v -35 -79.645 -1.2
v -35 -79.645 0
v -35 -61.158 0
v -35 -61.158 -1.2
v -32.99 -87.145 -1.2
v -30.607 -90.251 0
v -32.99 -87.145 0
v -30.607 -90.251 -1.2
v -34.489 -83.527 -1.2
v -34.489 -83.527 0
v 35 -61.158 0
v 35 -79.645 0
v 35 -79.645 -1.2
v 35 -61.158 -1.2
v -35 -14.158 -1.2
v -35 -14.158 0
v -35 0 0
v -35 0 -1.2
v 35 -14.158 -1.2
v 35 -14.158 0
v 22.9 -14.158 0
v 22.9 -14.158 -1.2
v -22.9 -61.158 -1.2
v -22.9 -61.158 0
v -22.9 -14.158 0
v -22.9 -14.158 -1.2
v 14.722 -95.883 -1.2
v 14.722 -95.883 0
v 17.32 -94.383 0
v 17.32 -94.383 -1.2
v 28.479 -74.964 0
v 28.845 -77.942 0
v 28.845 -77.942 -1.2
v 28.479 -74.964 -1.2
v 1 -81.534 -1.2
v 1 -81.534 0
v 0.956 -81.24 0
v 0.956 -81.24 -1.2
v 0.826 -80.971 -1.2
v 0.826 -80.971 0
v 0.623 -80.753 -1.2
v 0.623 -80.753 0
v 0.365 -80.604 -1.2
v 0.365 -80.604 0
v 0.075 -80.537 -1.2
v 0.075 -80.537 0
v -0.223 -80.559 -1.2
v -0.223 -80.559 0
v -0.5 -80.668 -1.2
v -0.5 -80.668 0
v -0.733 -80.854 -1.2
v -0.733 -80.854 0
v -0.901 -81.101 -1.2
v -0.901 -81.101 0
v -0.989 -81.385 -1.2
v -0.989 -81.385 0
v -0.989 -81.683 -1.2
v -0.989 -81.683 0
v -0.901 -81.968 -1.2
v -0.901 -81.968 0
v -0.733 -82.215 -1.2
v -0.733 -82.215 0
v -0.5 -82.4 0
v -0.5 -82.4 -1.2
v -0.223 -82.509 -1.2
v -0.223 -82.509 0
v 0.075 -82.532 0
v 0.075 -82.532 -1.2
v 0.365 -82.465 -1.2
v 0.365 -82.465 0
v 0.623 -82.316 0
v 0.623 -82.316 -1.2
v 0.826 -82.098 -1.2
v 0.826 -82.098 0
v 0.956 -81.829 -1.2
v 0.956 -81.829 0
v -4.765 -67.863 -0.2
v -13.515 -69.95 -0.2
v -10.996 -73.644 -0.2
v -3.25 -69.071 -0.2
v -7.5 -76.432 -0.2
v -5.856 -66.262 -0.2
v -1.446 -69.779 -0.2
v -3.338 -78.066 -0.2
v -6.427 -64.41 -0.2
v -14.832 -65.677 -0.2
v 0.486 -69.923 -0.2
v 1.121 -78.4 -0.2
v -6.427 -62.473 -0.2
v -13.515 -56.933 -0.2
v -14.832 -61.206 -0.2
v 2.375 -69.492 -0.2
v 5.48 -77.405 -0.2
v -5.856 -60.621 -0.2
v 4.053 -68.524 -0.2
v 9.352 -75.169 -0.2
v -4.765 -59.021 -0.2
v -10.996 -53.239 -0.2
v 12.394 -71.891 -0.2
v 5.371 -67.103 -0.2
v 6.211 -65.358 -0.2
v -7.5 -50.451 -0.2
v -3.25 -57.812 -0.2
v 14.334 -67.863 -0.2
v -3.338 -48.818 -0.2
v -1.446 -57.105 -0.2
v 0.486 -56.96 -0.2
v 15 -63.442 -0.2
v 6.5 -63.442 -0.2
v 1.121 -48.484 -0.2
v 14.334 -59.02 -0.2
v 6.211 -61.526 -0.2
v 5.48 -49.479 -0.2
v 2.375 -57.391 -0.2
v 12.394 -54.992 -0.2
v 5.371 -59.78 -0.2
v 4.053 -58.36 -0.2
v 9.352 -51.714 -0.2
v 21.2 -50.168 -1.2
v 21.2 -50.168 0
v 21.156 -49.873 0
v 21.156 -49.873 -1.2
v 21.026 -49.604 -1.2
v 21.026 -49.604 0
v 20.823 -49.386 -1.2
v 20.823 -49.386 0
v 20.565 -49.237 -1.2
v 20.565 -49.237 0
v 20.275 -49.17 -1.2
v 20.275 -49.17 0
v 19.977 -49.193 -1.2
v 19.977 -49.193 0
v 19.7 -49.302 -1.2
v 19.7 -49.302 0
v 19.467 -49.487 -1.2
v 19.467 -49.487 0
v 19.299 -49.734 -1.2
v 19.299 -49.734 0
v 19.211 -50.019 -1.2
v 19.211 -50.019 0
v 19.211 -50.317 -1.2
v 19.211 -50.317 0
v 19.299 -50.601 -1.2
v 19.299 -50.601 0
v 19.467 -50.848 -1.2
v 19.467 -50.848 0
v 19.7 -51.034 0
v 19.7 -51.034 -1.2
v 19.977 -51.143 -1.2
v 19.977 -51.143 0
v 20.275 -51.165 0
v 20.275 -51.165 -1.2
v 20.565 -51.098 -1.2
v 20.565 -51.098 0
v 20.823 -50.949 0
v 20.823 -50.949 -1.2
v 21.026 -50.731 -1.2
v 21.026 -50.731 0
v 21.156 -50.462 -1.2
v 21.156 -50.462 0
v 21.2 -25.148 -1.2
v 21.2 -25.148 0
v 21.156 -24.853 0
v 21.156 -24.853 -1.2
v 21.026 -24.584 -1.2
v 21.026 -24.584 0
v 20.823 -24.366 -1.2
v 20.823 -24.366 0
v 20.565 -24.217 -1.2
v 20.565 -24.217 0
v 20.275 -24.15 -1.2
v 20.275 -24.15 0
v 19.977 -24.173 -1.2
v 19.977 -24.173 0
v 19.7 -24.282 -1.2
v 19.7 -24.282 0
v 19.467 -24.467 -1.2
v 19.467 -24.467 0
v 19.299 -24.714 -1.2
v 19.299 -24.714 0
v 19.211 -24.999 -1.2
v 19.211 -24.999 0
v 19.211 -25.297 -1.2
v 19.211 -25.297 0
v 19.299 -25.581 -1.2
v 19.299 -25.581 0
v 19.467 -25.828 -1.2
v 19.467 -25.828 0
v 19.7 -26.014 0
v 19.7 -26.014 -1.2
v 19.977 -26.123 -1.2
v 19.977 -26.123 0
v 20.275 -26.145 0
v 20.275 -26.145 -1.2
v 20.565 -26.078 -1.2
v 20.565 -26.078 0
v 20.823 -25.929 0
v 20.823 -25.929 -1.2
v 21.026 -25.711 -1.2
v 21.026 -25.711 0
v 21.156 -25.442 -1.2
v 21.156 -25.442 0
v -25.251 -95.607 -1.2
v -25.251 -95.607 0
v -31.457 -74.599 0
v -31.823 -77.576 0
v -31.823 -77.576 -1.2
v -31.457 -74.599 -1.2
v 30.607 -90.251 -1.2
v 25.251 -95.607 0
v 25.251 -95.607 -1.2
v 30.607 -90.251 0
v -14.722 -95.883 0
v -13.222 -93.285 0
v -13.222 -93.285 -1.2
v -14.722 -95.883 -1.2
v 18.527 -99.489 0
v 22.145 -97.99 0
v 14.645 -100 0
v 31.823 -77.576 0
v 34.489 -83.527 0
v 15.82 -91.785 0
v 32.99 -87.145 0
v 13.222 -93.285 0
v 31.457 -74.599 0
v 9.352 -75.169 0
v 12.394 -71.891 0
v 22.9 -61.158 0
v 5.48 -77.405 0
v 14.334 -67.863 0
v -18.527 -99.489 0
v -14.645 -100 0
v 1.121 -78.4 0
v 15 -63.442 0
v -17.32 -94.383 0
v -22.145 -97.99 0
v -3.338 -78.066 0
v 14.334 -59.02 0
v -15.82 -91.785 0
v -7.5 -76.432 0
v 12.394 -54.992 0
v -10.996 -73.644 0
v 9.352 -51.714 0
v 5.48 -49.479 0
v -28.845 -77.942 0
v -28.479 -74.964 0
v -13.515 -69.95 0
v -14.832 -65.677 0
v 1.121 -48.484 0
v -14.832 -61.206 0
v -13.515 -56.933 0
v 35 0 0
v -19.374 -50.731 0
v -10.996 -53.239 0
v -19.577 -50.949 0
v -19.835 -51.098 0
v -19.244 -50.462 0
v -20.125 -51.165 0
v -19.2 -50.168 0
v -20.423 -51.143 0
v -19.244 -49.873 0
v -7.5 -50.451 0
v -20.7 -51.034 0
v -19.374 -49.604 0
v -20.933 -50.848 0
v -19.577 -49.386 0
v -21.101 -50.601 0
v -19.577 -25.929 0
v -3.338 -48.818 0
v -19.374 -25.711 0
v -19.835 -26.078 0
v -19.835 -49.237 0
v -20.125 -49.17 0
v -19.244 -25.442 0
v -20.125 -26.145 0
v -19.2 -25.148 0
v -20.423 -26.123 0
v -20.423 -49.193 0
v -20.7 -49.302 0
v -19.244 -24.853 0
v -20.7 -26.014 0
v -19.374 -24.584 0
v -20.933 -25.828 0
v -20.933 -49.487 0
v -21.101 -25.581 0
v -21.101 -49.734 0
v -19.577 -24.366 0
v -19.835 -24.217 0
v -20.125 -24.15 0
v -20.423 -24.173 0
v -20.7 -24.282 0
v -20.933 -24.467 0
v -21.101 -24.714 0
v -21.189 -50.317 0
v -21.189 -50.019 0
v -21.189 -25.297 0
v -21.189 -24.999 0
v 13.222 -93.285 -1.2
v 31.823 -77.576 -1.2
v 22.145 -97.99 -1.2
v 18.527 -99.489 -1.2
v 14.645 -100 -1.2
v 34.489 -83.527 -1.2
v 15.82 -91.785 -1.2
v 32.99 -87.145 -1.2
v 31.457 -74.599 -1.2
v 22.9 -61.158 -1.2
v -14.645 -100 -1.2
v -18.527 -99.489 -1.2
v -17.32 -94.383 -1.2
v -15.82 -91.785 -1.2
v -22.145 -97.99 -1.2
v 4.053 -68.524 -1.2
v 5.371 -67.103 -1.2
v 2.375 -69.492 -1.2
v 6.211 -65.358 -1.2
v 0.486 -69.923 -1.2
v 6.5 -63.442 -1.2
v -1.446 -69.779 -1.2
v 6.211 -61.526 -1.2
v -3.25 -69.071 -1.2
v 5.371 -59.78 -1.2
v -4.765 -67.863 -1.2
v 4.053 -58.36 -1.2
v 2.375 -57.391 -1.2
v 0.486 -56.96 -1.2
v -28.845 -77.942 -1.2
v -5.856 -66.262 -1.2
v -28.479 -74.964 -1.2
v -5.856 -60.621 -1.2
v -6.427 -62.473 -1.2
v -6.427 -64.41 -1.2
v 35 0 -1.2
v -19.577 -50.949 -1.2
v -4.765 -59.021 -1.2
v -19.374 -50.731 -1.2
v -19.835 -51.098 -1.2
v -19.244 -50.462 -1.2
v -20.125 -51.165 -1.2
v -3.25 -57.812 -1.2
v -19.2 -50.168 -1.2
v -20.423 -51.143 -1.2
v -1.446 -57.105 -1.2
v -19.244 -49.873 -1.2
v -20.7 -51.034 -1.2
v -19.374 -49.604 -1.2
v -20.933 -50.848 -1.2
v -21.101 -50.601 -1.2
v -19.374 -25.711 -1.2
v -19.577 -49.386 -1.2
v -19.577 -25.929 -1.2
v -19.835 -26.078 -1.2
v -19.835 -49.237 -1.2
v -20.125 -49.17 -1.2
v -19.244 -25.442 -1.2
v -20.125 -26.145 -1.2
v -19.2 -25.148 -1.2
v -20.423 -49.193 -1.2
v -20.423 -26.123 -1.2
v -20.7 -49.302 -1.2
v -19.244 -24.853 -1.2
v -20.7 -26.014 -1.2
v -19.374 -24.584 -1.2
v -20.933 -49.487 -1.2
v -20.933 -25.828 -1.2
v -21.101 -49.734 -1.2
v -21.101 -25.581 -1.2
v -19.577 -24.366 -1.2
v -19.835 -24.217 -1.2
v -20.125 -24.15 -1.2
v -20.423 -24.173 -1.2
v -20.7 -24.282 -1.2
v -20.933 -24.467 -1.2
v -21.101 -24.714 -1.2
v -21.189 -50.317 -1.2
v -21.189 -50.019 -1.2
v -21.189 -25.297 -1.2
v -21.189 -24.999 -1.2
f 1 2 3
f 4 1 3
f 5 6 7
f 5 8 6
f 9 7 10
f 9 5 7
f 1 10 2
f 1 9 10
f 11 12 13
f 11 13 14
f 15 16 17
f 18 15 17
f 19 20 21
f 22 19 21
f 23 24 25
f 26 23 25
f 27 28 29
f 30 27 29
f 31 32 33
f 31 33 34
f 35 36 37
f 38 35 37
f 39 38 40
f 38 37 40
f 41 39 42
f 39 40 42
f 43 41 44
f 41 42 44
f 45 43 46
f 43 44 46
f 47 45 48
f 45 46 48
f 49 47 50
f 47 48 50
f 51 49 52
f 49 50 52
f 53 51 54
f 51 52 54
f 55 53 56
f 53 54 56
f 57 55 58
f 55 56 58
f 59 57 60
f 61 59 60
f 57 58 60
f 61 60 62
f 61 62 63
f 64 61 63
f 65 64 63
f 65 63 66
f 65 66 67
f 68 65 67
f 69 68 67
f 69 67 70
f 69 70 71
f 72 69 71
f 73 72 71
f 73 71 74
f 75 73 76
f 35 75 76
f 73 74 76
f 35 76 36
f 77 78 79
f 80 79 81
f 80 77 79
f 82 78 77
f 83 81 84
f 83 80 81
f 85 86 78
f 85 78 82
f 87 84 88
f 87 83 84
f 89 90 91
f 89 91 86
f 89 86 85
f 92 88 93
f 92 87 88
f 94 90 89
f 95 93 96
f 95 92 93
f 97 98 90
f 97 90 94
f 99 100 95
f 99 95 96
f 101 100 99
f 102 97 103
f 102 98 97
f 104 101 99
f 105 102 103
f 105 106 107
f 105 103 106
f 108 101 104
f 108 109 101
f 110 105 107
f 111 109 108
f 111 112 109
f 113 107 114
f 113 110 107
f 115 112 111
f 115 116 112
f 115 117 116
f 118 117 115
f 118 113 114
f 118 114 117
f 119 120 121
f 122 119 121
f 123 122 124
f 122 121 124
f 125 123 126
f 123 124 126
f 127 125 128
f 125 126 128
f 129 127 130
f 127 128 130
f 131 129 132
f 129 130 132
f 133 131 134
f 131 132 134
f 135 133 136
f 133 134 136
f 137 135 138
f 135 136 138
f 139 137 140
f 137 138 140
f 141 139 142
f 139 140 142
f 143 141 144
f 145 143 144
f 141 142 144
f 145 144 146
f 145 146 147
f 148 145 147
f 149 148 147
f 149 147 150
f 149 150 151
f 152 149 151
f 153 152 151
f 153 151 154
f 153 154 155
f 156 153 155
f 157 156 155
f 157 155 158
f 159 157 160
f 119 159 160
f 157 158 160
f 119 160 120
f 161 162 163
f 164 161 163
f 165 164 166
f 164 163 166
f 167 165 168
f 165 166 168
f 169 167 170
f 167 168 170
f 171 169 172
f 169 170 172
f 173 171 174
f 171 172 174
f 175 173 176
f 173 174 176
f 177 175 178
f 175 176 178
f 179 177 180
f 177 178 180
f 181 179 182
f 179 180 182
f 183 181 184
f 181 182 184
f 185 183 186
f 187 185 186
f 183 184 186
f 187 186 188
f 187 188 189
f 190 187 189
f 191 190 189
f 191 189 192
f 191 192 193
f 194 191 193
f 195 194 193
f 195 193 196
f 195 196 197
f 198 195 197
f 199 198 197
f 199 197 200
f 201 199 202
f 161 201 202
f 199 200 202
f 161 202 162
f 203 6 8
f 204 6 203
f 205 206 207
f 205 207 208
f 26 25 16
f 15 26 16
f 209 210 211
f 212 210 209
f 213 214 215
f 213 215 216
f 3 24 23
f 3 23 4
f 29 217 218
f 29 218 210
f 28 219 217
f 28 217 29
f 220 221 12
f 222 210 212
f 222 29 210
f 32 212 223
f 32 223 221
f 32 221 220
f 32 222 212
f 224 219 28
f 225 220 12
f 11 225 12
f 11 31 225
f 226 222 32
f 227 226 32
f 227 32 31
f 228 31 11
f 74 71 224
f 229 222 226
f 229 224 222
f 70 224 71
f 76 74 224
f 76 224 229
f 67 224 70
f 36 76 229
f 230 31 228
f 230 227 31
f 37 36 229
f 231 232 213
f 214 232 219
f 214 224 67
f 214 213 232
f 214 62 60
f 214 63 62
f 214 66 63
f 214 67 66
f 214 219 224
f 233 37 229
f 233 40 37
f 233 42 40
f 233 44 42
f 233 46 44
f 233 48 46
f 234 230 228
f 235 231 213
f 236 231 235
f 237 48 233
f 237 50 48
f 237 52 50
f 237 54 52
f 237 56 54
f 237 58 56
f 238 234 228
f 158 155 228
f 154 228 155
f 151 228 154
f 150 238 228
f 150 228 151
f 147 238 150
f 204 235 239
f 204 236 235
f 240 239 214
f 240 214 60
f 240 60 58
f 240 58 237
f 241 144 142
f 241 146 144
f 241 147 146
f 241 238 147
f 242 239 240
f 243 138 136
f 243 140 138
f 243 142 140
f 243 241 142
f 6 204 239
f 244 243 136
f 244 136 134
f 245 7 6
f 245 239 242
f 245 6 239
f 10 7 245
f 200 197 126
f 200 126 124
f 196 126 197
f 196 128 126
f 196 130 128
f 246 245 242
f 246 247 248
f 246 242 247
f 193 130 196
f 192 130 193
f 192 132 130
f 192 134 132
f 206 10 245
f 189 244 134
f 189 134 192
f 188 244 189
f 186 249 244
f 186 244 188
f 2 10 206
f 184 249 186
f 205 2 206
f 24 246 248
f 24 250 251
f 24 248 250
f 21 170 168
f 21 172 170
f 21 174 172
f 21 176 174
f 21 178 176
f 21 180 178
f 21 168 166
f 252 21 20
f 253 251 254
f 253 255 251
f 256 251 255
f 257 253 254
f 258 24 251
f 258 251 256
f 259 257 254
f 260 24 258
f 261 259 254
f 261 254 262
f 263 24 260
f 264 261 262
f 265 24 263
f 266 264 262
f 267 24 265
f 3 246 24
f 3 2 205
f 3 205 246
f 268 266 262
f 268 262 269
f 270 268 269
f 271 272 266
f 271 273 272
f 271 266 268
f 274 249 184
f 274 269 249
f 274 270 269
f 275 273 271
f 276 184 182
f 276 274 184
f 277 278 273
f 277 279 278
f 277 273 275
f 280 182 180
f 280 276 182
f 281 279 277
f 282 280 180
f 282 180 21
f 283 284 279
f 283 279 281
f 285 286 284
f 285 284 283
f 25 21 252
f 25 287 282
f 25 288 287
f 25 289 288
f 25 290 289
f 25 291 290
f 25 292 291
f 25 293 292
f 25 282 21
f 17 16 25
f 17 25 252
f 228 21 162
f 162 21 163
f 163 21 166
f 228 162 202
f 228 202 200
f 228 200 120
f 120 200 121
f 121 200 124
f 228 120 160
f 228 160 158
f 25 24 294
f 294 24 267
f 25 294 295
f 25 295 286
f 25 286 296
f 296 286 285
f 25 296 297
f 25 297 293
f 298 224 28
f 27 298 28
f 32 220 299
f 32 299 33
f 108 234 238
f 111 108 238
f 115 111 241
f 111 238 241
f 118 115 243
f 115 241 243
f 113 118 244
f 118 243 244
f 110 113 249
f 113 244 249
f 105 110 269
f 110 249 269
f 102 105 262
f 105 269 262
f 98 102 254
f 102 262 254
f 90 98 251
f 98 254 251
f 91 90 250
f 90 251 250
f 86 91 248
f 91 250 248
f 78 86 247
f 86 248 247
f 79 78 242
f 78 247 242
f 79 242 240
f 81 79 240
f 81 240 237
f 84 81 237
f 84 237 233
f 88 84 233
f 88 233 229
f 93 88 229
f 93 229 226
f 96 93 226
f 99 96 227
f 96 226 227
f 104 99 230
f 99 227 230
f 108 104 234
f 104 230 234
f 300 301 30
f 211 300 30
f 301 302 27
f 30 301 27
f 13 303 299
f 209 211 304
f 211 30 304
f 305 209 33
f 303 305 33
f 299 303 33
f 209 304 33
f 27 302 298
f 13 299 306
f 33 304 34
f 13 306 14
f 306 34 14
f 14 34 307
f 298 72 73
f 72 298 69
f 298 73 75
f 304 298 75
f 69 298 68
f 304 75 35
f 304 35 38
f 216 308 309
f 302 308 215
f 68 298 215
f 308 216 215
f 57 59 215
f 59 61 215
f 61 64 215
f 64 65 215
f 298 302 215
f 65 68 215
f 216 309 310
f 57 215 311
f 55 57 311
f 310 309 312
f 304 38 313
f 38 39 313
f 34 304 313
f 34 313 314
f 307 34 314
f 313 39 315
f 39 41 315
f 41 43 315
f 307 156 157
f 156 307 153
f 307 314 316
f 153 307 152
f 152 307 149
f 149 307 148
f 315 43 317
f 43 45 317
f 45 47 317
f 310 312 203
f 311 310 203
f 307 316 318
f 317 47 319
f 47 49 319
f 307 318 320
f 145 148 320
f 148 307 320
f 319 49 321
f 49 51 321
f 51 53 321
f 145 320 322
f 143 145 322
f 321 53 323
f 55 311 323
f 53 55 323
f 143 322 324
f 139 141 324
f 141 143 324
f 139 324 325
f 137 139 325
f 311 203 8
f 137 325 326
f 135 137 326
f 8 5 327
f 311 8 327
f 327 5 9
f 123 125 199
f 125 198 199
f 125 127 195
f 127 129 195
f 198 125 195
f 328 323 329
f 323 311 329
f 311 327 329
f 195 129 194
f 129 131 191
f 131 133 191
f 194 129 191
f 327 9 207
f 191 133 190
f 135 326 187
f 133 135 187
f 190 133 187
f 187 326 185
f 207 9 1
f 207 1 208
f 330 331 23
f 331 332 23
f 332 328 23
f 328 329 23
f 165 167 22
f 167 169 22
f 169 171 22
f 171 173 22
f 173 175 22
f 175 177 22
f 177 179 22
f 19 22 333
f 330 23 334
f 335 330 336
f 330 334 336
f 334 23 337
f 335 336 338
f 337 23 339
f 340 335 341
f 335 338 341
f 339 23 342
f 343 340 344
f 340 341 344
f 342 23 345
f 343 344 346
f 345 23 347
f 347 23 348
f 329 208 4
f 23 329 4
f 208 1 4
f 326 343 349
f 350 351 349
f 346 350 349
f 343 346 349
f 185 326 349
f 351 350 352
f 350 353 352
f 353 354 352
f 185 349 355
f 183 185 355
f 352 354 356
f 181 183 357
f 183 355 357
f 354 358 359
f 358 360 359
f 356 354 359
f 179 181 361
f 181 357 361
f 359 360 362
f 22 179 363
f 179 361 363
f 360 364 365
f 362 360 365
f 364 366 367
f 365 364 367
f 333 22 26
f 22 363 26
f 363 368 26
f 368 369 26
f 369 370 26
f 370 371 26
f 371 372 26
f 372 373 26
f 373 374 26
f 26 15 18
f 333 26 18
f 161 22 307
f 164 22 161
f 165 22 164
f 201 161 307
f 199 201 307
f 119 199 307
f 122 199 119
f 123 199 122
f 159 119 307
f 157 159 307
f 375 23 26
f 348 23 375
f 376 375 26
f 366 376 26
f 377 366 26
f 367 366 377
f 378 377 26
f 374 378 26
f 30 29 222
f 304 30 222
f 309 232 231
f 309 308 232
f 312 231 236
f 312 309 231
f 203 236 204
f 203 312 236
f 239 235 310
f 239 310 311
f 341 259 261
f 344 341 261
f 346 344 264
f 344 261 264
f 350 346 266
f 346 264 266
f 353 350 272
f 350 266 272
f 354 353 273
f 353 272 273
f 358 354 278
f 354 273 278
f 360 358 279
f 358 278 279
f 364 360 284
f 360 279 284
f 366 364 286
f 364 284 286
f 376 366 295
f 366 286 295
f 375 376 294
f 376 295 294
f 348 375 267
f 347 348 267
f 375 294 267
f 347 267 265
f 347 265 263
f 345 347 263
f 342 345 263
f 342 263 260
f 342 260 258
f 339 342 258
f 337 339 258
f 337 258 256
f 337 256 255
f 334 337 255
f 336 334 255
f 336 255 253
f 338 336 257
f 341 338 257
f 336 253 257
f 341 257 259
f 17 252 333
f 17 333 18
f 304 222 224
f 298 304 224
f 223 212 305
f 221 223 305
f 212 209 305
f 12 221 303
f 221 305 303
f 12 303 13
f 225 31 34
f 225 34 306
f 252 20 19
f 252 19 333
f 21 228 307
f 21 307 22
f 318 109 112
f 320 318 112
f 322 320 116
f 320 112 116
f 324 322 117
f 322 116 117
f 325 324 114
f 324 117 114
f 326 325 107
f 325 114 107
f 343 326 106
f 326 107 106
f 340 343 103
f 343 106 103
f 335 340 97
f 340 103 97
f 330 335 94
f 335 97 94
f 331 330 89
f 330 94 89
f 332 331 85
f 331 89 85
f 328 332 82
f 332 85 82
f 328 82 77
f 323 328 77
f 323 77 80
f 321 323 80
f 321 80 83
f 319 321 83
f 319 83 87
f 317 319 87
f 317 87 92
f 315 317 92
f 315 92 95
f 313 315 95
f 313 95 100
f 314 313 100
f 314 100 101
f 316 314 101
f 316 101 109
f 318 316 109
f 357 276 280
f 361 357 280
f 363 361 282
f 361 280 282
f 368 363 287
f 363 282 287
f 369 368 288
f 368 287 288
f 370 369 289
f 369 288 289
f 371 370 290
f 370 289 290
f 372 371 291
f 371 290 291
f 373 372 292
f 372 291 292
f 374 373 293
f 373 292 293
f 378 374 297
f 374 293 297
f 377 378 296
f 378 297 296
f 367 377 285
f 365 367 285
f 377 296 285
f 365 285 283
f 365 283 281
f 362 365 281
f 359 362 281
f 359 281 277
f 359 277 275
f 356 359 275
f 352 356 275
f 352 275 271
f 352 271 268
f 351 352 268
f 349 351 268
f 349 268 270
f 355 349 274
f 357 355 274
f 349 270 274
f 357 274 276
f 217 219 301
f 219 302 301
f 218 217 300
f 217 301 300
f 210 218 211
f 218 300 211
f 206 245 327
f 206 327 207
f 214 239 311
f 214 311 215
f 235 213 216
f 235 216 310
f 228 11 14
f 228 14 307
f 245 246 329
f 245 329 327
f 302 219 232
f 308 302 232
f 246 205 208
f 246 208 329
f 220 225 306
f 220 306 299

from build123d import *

# Parameters (mm, degrees)
SKETCH_1_W          = 100
SKETCH_1_H          = 70
SKETCH_1_R          = 1
SKETCH_1_R_2        = 6.5
EXTRUDE_2_DEPTH     = 1.2
SKETCH_2_W          = 47
SKETCH_2_H          = 12.1
CUT_EXTRUDE_1_DEPTH = 106.954896064
SKETCH_4_R          = 15
CUT_EXTRUDE_2_DEPTH = 0.2
CUT_EXTRUDE_4_DEPTH = 106.954896064
FILLET_3_R          = 15
CUT_EXTRUDE_6_DEPTH = 106.954896064


with BuildPart() as part:
    # ｽｹｯﾁ1 → ﾎﾞｽ - 押し出し2 (new body)
    with BuildSketch(Plane(origin=(0, 0, 0), x_dir=(0, 1, 0), z_dir=(0, 0, 1))):
        with Locations((-50, 0)):
            Rectangle(SKETCH_1_W, SKETCH_1_H)
        with Locations(Location((-25.147606065, 20.2, 0), (0, 0, 270))):
            Circle(SKETCH_1_R, mode=Mode.SUBTRACT)
        with Locations(Location((-50.167606065, 20.2, 0), (0, 0, 270))):
            Circle(SKETCH_1_R, mode=Mode.SUBTRACT)
        with Locations(Location((-25.147606065, -20.2, 0), (0, 0, 270))):
            Circle(SKETCH_1_R, mode=Mode.SUBTRACT)
        with Locations(Location((-50.167606065, -20.2, 0), (0, 0, 270))):
            Circle(SKETCH_1_R, mode=Mode.SUBTRACT)
        with Locations(Location((-63.441664971, 0, 0), (0, 0, 270))):
            Circle(SKETCH_1_R_2, mode=Mode.SUBTRACT)
        with Locations(Location((-81.5344254, 0, 0), (0, 0, 270))):
            Circle(SKETCH_1_R, mode=Mode.SUBTRACT)
    extrude(amount=-EXTRUDE_2_DEPTH)

    # ｽｹｯﾁ2 → ｶｯﾄ - 押し出し1 (cut, through all)
    with BuildSketch(Plane(origin=(0, 0, 0), x_dir=(0, 1, 0), z_dir=(0, 0, 1))):
        with Locations((-37.657606065, 28.95)):
            Rectangle(SKETCH_2_W, SKETCH_2_H)
        with Locations((-37.657606065, -28.95)):
            Rectangle(SKETCH_2_W, SKETCH_2_H)
    extrude(amount=-CUT_EXTRUDE_1_DEPTH, mode=Mode.SUBTRACT)

    # ｽｹｯﾁ4 → ｶｯﾄ - 押し出し2 (cut)
    with BuildSketch(Plane.XY):
        with Locations((0, -63.441664971)):
            Circle(SKETCH_4_R)
    extrude(amount=-CUT_EXTRUDE_2_DEPTH, mode=Mode.SUBTRACT)

    # ｽｹｯﾁ7 → ｶｯﾄ - 押し出し4 (cut, through all)
    with BuildSketch(Plane.XY):
        Polygon((-35, -85.857864376), (-20.857864376, -100), (-35, -100), align=None)
        Polygon((35, -85.857864376), (35, -100), (20.857864376, -100), align=None)
    extrude(amount=-CUT_EXTRUDE_4_DEPTH, mode=Mode.SUBTRACT)

    # ﾌｨﾚｯﾄ3
    fillet_3_edges = [part.edges().sort_by_distance(p)[0] for p in [
        (-35, -85.857864376, -0.6),
        (-20.857864376, -100, -0.6),
        (20.857864376, -100, -0.6),
        (35, -85.857864376, -0.6),
    ]]
    fillet(fillet_3_edges, radius=FILLET_3_R)

    # ｽｹｯﾁ11 → ｶｯﾄ - 押し出し6 (cut, through all)
    with BuildSketch(Plane.XY):
        Polygon((31.822624011, -77.576242792), (28.844985556, -77.941850822), (28.479377526, -74.964212367), (31.45701598, -74.598604337), align=None)
        Polygon((15.82016764, -91.78479944), (13.222091429, -93.28479944), (14.722091429, -95.882875652), (17.32016764, -94.382875652), align=None)
        Polygon((-31.45701598, -74.598604337), (-28.479377526, -74.964212367), (-28.844985556, -77.941850822), (-31.822624011, -77.576242792), align=None)
        Polygon((-14.722091429, -95.882875652), (-17.32016764, -94.382875652), (-15.82016764, -91.78479944), (-13.222091429, -93.28479944), align=None)
    extrude(amount=-CUT_EXTRUDE_6_DEPTH, mode=Mode.SUBTRACT)


solid = part.part
